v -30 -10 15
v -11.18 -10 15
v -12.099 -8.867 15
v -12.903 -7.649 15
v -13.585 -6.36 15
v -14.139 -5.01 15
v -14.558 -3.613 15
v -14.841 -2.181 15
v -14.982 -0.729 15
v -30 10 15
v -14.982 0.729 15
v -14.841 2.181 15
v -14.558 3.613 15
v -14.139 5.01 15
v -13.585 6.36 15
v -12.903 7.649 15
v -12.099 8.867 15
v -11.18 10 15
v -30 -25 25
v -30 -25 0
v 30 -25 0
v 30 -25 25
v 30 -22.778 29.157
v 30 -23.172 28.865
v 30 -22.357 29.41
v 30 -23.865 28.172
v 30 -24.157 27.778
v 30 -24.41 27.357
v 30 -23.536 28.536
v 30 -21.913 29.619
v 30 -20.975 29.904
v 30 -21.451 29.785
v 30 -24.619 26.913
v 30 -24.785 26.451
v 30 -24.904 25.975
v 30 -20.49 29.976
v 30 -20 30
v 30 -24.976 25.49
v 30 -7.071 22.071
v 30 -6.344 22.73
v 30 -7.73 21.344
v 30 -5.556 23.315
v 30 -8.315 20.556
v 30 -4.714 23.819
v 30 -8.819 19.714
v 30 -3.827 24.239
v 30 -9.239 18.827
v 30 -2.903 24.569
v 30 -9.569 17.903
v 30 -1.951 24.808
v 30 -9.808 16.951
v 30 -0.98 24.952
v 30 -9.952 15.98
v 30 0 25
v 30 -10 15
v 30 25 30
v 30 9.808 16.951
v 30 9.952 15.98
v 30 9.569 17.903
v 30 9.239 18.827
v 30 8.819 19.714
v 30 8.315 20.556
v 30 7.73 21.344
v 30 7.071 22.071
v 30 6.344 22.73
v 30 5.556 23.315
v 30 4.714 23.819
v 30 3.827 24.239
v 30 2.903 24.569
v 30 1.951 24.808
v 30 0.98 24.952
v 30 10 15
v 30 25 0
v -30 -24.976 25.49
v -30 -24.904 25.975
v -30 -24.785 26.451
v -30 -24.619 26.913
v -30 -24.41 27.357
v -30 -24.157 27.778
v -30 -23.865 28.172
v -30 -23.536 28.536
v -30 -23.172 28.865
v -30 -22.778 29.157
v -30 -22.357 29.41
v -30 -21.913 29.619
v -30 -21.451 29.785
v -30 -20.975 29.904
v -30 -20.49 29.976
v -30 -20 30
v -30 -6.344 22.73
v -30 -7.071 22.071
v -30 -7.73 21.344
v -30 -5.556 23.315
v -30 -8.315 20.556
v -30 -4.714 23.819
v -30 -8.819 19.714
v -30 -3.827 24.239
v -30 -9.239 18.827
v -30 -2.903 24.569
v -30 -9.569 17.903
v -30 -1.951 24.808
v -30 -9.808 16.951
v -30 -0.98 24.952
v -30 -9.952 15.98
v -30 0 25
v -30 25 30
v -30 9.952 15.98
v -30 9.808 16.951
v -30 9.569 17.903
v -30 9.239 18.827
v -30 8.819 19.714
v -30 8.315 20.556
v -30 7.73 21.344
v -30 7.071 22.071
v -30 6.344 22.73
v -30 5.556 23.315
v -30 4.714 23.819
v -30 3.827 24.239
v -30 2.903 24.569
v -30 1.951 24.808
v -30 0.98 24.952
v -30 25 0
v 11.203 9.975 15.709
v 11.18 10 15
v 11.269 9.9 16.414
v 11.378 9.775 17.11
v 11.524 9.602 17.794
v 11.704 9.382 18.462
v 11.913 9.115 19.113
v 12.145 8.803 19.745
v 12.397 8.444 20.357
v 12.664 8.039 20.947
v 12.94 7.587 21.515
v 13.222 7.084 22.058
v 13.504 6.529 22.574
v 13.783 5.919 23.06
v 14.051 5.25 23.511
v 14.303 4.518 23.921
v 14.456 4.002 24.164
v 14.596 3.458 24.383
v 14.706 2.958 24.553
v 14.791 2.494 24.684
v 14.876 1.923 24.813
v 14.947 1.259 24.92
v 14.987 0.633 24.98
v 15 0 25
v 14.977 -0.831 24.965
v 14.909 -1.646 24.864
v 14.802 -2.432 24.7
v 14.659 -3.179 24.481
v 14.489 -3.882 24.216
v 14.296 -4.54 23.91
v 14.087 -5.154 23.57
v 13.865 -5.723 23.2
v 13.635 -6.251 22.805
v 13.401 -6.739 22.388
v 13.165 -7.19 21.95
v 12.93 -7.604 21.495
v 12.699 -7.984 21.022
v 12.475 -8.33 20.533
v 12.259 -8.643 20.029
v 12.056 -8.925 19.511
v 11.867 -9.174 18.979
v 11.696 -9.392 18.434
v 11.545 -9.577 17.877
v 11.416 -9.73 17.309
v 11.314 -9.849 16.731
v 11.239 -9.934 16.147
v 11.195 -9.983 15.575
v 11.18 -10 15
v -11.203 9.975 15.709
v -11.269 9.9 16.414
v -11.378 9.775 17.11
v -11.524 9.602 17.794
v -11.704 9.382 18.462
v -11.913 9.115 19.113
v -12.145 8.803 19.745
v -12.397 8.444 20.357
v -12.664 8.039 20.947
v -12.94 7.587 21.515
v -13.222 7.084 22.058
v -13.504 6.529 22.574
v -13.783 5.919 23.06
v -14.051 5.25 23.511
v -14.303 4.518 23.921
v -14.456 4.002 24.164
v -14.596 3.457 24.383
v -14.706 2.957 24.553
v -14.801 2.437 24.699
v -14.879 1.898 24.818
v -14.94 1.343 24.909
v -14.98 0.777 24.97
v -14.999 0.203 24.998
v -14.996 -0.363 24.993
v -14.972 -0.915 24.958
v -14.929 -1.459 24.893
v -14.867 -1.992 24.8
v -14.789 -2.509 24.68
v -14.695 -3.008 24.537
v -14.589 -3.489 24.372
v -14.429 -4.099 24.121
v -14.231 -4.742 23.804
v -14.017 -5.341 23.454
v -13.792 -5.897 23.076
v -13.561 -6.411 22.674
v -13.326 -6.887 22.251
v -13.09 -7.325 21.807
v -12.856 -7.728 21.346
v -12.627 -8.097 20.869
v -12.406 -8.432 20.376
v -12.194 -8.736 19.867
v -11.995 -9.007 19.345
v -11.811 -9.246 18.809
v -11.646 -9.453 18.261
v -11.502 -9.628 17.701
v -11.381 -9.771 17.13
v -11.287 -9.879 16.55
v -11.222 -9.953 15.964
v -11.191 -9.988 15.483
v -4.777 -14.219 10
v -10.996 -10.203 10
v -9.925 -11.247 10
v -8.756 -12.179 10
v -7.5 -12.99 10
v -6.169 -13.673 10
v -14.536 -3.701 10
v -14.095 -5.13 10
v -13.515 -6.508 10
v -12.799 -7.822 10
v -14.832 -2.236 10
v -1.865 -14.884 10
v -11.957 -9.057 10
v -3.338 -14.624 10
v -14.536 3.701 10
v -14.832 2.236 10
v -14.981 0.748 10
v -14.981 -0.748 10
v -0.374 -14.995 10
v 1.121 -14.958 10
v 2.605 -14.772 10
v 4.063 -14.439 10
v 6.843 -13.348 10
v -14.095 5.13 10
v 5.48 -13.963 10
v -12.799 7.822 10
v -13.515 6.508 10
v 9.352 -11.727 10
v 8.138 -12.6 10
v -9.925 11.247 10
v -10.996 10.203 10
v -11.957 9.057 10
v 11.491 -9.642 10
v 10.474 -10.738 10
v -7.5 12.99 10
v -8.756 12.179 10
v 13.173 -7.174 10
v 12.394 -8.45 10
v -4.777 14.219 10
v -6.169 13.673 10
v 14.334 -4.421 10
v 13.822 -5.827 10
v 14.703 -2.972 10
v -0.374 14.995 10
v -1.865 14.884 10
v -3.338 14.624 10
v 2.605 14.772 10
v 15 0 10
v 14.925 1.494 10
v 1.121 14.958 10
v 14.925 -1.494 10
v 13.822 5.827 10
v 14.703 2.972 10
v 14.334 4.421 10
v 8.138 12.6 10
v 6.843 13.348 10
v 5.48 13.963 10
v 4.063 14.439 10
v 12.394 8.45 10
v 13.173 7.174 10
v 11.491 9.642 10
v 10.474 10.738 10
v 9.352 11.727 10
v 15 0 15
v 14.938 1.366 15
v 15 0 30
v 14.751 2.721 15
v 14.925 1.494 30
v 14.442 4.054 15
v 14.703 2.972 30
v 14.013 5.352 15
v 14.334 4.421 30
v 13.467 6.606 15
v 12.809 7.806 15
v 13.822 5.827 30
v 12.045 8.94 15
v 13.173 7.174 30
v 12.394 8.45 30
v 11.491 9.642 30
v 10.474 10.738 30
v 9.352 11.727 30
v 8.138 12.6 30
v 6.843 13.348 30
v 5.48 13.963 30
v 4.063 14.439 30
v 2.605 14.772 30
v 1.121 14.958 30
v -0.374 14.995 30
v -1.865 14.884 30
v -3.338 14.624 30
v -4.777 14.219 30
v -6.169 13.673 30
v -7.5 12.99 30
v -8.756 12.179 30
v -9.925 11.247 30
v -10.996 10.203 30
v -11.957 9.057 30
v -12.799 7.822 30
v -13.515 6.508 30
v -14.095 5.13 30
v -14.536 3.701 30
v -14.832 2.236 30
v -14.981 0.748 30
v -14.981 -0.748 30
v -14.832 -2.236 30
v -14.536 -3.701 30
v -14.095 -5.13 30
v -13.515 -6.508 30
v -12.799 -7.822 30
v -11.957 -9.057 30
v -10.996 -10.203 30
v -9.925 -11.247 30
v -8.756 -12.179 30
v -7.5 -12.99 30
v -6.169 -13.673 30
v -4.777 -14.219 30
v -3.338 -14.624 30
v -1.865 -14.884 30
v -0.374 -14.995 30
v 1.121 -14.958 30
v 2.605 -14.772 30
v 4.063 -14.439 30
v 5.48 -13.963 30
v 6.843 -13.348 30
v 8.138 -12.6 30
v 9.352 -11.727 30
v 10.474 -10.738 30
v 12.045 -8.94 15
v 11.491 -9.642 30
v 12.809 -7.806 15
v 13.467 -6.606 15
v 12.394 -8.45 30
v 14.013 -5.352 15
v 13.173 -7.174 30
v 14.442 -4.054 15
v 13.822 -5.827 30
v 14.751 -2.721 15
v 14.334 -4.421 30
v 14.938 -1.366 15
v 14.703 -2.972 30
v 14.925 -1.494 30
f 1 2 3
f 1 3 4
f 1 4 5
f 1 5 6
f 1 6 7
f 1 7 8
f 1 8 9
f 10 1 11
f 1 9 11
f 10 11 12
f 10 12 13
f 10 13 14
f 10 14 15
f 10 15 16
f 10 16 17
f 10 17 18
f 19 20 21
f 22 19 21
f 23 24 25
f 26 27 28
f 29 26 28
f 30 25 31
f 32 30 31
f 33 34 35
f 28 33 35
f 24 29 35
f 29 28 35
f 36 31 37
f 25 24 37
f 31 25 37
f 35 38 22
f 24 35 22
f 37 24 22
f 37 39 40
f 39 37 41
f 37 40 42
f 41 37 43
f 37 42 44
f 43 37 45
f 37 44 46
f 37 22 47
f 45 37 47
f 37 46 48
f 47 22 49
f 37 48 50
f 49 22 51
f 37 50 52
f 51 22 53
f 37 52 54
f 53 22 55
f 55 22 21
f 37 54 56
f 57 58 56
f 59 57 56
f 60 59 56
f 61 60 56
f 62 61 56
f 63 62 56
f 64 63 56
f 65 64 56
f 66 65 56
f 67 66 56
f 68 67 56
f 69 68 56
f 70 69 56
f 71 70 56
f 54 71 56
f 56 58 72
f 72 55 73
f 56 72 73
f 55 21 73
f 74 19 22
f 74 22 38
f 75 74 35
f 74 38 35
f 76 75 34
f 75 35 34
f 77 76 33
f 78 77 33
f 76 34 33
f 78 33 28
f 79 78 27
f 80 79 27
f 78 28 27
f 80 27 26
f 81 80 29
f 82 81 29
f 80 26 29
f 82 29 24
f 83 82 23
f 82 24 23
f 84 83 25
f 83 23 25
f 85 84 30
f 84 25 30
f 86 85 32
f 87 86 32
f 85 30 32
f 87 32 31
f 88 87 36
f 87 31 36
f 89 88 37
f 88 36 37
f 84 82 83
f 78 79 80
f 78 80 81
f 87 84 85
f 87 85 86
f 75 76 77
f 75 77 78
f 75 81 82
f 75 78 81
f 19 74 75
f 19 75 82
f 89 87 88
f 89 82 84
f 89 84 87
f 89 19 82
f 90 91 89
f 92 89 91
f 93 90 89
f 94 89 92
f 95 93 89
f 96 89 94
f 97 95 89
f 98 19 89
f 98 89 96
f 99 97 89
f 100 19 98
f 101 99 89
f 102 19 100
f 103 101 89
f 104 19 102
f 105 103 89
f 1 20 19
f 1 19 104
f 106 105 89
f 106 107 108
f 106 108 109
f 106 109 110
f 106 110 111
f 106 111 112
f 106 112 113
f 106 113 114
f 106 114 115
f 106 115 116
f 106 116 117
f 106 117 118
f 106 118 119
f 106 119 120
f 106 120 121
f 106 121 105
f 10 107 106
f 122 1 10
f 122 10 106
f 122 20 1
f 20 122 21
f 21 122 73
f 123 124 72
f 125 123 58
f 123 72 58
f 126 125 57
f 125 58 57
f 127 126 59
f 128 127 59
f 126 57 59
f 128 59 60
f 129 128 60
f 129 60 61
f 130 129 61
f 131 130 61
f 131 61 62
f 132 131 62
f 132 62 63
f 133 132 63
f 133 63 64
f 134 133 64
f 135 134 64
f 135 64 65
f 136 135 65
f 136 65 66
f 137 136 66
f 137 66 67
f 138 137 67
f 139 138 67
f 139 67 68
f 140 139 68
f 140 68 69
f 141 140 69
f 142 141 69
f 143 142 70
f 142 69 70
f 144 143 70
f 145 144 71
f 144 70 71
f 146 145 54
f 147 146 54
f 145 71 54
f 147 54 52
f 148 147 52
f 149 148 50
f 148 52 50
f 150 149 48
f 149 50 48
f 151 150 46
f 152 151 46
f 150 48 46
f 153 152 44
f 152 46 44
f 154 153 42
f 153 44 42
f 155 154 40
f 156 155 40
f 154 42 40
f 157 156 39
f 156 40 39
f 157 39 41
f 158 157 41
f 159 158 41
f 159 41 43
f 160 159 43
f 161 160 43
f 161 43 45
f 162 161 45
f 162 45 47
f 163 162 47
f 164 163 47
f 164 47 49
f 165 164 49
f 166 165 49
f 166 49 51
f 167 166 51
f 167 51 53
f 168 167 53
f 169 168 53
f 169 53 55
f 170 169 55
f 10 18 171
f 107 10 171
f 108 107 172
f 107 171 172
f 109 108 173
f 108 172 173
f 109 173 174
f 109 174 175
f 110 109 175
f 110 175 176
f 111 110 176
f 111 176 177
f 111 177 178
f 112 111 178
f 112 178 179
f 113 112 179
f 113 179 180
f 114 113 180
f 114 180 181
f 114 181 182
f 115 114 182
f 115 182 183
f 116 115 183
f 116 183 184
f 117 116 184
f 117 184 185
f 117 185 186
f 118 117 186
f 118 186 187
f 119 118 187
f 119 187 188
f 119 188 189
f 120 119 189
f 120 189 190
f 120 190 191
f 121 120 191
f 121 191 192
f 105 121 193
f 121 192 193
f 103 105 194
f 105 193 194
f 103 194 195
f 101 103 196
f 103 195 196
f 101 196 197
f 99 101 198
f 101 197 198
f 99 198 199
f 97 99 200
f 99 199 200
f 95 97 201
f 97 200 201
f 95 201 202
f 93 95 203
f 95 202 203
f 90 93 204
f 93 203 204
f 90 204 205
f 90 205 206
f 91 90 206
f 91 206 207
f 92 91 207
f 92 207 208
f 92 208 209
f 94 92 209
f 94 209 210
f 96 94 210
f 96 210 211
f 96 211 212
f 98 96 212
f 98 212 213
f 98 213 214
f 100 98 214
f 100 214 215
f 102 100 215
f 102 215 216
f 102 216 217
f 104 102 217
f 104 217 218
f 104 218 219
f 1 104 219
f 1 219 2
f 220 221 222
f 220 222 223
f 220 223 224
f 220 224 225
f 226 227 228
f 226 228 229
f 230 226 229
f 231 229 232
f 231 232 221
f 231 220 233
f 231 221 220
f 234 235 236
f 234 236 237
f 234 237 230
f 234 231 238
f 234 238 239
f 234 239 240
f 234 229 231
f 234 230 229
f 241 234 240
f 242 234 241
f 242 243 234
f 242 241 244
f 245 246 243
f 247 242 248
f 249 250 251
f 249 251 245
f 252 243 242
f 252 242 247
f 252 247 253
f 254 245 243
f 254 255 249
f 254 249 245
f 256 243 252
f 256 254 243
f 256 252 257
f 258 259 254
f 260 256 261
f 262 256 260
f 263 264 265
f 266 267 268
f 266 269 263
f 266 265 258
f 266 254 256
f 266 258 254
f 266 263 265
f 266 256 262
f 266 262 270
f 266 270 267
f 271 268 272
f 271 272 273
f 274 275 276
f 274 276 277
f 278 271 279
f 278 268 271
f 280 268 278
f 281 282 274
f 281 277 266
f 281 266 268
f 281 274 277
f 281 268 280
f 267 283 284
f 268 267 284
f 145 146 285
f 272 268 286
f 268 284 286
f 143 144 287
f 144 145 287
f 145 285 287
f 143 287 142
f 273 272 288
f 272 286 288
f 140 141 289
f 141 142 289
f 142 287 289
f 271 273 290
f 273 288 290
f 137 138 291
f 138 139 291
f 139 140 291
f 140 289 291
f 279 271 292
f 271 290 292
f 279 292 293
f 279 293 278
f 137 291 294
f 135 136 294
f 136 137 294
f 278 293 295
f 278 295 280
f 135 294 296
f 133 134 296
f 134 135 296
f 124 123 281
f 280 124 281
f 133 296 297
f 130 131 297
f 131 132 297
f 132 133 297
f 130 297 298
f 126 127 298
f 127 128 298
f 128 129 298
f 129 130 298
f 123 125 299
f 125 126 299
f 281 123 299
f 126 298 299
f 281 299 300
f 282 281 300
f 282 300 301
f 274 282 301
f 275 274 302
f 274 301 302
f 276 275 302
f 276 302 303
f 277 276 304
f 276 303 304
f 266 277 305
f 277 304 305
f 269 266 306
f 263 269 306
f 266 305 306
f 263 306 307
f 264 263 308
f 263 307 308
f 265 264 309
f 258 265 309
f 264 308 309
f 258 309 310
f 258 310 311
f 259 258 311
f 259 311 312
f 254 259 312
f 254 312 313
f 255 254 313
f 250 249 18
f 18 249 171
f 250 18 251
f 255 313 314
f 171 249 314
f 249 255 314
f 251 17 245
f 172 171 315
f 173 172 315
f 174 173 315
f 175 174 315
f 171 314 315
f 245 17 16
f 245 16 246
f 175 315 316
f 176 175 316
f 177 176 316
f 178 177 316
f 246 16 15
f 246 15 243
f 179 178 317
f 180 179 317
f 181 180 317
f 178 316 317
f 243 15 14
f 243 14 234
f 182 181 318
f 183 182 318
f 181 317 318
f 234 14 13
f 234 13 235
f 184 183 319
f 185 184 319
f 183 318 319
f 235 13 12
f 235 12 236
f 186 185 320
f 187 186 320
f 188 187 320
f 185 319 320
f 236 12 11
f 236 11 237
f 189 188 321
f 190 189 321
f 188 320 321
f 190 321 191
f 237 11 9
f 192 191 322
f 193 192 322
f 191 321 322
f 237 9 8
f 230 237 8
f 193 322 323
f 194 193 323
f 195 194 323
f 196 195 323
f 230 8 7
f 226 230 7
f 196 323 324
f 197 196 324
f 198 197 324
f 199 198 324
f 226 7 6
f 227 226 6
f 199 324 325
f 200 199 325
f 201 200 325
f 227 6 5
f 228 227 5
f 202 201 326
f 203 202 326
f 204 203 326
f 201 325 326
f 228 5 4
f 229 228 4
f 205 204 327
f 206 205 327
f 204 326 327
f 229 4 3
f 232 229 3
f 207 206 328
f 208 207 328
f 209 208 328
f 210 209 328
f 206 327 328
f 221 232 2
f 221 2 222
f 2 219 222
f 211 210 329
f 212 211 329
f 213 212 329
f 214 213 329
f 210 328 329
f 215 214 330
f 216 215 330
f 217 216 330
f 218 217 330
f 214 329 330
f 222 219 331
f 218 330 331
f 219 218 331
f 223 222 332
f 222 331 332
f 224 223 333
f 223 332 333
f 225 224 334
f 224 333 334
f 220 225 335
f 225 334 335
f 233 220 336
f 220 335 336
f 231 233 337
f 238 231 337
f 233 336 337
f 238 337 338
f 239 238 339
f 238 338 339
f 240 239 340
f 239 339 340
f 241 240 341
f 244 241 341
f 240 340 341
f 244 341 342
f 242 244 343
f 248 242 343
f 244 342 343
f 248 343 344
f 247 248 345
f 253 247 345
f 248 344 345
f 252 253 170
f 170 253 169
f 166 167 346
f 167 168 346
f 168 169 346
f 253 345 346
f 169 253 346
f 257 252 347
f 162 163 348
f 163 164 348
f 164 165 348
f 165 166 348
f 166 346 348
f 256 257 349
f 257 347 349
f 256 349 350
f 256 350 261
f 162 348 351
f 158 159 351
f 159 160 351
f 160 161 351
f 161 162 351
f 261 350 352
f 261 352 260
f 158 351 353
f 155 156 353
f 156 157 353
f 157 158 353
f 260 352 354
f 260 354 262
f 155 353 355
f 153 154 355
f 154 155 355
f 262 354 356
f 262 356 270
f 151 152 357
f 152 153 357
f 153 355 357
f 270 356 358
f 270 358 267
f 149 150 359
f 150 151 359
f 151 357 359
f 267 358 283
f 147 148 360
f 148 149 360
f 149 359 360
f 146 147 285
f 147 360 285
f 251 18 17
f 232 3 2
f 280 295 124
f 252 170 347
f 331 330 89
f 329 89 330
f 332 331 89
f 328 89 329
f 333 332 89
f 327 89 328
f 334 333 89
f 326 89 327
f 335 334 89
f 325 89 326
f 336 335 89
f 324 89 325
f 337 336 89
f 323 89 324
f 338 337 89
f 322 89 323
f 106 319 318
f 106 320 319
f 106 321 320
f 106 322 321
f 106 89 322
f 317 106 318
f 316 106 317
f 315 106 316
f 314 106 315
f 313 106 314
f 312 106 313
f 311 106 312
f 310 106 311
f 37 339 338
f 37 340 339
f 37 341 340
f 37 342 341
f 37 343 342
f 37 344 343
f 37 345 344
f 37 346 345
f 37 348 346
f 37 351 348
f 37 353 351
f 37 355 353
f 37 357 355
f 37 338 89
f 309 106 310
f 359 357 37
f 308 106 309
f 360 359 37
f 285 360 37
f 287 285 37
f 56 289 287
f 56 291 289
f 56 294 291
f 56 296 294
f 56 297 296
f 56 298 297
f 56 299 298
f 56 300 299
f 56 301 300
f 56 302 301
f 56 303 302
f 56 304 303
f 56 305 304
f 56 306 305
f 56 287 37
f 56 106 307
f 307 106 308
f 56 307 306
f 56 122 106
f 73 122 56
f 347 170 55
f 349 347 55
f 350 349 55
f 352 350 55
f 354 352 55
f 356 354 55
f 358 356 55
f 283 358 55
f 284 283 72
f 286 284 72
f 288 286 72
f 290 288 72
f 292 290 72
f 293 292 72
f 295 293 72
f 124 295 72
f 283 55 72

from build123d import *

# Parameters (mm, degrees)
SKETCH_W        = 60
SKETCH_H        = 50
PAD_DEPTH       = 30
SKETCH001_R     = 15
POCKET_DEPTH    = 20
POCKET001_DEPTH = 60.001
FILLET_R        = 5


with BuildPart() as part:
    # Sketch → Pad (new body)
    with BuildSketch(Plane.XY):
        Rectangle(SKETCH_W, SKETCH_H)
    extrude(amount=PAD_DEPTH)

    # Sketch001 (on Face6 of Pad) → Pocket (cut)
    with BuildSketch(Plane.XY.offset(30)):
        Circle(SKETCH001_R)
    extrude(amount=-POCKET_DEPTH, mode=Mode.SUBTRACT)

    # Sketch002 (on Face3 of Pocket) → Pocket001 (cut, through all)
    with BuildSketch(Plane.YZ.offset(30)):
        with BuildLine():
            ThreePointArc((10, 15), (0, 25), (-10, 15))
            Line((-10, 15), (10, 15))
        make_face()
    extrude(amount=-POCKET001_DEPTH, mode=Mode.SUBTRACT)

    # Fillet
    fillet_edges = [part.edges().sort_by_distance(p)[0] for p in [
        (0, -25, 30),
    ]]
    fillet(fillet_edges, radius=FILLET_R)


solid = part.part
